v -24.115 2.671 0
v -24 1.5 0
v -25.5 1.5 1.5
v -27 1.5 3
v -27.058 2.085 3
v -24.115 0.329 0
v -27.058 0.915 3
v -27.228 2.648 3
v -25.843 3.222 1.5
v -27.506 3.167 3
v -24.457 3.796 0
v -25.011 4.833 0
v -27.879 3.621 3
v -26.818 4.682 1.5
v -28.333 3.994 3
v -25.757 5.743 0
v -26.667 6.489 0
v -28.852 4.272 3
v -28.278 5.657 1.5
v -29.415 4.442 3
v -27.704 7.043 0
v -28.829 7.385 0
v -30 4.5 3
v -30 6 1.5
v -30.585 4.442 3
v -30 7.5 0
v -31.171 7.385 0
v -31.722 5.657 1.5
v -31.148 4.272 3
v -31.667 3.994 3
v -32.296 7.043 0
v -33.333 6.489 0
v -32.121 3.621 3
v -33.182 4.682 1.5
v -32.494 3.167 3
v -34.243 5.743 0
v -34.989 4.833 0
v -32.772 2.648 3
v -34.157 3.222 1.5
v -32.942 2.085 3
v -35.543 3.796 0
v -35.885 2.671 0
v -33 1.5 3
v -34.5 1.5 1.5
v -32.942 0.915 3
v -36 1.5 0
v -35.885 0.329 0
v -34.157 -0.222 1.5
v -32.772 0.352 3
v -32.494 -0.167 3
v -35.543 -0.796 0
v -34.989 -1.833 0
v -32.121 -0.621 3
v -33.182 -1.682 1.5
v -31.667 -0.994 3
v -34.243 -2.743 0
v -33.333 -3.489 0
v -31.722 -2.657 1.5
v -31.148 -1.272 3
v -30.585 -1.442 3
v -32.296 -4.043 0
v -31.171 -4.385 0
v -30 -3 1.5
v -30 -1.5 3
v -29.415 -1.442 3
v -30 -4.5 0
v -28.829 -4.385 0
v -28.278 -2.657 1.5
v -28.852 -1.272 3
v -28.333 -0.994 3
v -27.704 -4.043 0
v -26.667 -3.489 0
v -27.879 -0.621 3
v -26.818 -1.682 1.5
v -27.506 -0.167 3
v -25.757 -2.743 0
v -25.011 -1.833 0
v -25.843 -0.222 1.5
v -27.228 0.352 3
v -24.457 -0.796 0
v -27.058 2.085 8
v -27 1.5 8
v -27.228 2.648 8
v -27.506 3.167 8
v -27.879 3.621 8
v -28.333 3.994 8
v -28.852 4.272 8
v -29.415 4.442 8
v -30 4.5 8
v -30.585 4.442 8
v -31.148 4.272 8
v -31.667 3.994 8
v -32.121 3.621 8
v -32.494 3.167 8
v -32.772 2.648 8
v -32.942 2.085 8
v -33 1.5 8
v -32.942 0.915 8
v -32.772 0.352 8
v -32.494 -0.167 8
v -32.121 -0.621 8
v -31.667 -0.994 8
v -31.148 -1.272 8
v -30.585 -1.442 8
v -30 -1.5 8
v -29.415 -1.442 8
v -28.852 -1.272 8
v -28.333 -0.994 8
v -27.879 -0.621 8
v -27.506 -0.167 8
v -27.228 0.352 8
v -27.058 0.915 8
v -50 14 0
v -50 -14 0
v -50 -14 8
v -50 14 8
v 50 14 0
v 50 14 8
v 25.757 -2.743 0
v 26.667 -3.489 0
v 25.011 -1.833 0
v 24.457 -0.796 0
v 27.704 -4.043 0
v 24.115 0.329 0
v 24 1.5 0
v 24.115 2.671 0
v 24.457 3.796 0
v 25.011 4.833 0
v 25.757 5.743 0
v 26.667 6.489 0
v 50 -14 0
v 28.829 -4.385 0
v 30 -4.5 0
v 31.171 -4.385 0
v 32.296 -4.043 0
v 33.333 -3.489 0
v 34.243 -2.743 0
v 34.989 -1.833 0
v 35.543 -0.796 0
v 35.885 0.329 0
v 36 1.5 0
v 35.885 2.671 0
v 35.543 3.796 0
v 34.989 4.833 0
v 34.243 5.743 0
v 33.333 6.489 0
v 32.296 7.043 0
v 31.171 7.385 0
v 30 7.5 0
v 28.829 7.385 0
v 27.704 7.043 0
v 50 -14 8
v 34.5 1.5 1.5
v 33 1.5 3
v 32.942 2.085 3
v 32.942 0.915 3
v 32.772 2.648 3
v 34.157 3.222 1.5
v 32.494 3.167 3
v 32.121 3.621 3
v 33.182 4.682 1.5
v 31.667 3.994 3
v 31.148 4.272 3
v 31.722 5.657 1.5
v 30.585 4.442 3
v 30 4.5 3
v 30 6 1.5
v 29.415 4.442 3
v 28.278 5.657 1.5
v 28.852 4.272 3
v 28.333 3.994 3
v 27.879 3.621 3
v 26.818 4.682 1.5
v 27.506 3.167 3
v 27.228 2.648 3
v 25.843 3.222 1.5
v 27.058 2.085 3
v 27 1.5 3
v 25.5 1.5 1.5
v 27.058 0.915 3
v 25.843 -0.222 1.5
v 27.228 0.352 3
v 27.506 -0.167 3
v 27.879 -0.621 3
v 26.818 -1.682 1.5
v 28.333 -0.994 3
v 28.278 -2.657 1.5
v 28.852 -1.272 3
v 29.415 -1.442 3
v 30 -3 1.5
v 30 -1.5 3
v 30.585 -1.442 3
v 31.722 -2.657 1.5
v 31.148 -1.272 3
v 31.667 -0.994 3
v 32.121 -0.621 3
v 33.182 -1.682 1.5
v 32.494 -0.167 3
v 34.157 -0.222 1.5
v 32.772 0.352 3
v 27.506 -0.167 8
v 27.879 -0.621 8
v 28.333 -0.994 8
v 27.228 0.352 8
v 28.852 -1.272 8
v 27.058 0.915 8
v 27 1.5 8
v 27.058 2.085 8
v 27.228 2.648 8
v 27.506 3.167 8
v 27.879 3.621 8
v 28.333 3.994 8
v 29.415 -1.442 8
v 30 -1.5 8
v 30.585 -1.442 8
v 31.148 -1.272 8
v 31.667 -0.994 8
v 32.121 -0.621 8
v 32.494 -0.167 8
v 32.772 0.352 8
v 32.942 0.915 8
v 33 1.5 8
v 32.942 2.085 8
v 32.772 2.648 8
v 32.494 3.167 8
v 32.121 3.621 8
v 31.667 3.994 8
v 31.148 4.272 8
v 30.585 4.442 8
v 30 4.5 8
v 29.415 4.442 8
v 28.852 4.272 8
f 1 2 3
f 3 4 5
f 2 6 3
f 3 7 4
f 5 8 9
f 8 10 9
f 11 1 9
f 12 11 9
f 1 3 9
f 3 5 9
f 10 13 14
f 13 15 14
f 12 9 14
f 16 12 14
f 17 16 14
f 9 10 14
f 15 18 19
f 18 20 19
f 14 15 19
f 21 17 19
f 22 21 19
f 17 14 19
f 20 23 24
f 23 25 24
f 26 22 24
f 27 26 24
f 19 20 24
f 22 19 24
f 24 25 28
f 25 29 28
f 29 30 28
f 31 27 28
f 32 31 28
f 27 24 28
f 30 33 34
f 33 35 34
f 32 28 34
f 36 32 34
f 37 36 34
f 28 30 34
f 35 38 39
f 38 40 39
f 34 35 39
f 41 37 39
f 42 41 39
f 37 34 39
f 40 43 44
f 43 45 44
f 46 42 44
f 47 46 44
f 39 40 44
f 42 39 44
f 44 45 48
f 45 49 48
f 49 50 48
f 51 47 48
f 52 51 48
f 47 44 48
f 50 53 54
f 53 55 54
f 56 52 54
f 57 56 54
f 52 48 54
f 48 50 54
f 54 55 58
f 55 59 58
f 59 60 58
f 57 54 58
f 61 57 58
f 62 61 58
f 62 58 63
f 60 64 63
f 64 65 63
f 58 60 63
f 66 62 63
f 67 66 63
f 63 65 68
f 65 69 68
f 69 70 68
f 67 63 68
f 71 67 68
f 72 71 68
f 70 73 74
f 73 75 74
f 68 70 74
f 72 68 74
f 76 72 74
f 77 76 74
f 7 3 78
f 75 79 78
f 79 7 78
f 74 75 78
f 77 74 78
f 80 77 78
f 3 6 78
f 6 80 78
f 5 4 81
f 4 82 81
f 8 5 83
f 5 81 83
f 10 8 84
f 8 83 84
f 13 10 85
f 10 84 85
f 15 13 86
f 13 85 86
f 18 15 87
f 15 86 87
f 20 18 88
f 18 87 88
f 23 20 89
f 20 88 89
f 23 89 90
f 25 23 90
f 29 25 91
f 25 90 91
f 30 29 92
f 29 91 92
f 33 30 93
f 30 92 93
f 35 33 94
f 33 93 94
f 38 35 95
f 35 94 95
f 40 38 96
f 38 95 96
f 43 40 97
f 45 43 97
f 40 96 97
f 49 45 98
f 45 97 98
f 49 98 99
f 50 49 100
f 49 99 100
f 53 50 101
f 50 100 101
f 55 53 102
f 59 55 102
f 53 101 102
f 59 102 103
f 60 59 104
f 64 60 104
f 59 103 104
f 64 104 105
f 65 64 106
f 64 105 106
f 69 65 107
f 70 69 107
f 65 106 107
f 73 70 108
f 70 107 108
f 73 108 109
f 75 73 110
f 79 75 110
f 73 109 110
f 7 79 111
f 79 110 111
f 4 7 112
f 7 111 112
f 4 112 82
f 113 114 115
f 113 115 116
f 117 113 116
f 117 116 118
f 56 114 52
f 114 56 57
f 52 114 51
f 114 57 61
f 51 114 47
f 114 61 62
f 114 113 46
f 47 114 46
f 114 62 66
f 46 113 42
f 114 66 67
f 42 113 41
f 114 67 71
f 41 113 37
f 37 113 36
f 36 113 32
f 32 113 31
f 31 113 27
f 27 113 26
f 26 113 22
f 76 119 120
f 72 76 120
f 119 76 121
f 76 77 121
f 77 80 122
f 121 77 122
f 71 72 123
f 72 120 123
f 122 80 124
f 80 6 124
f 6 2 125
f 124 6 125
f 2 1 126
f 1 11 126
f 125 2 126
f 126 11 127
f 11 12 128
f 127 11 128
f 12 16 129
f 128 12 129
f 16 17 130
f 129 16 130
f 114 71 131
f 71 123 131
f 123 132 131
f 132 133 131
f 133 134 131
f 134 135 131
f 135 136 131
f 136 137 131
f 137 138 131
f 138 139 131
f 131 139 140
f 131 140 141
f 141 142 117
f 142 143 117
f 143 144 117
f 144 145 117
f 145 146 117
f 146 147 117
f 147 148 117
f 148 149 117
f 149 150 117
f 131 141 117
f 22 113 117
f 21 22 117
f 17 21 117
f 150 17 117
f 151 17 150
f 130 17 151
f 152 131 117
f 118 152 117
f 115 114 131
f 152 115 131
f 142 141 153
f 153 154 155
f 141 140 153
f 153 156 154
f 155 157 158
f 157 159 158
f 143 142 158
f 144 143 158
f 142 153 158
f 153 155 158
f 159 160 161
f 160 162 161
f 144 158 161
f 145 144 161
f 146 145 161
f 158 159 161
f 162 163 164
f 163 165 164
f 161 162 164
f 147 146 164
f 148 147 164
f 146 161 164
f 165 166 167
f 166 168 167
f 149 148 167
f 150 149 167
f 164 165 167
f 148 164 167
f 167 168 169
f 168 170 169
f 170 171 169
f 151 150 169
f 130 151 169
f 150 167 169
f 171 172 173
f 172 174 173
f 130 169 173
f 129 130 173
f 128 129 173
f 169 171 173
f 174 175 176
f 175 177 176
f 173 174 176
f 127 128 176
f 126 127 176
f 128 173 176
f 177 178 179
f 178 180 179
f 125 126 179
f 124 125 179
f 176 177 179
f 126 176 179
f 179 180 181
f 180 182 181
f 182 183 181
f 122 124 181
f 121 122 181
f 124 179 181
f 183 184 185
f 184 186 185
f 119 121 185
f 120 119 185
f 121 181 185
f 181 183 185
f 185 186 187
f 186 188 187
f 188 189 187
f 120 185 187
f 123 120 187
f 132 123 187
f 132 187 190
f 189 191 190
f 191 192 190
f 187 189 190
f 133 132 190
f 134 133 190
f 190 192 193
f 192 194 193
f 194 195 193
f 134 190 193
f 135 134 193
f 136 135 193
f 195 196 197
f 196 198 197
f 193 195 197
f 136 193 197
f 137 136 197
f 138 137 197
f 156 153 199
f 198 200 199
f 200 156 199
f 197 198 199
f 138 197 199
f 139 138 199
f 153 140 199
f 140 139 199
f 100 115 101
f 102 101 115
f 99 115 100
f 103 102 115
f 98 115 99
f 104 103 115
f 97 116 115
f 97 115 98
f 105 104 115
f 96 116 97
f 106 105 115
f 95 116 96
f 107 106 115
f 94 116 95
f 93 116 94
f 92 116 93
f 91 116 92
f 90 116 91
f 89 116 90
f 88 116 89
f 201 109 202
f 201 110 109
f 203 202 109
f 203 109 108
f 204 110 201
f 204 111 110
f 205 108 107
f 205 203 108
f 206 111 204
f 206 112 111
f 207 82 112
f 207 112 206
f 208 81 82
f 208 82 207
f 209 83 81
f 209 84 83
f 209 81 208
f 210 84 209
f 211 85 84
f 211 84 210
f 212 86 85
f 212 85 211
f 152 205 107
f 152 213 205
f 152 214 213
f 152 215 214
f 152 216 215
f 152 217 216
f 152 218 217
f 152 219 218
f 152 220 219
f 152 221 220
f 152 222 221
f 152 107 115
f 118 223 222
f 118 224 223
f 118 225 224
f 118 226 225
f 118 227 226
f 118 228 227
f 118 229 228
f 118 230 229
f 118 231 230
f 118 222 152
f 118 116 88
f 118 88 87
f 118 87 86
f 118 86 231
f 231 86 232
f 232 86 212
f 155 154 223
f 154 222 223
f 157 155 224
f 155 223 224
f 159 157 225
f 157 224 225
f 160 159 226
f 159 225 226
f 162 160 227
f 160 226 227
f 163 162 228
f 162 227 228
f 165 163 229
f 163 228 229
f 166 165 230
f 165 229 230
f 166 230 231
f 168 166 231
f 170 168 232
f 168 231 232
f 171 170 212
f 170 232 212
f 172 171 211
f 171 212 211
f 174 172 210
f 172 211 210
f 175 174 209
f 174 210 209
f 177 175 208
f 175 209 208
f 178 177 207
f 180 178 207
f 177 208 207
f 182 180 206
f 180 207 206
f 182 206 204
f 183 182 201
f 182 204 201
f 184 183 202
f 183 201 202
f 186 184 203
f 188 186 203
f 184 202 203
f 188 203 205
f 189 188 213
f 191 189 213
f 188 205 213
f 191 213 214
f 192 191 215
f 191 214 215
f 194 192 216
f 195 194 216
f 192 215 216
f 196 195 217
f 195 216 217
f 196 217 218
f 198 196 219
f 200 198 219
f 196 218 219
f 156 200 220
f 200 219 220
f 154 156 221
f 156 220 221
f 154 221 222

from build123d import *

# Parameters (mm, degrees)
SKETCH1_W                                           = 100
SKETCH1_H                                           = 28
BOSS_EXTRUDE1_DEPTH                                 = 8
CSK_FOR_M6_COUNTERSUNK_FLAT_HEAD_SCREW1_D           = 6
CSK_FOR_M6_COUNTERSUNK_FLAT_HEAD_SCREW1_CSINK_D     = 12
CSK_FOR_M6_COUNTERSUNK_FLAT_HEAD_SCREW1_CSINK_ANGLE = 90


with BuildPart() as part:
    # Sketch1 → Boss-Extrude1 (new body)
    with BuildSketch(Plane.XY):
        Rectangle(SKETCH1_W, SKETCH1_H)
    extrude(amount=BOSS_EXTRUDE1_DEPTH)

    # CSK for M6 Countersunk Flat Head Screw1 (through all)
    with Locations(Plane(origin=(0, 0, 0), x_dir=(-1, 0, 0), z_dir=(0, 0, -1))):
        with Locations((30, 1.5), (-30, 1.5)):
            CounterSinkHole(CSK_FOR_M6_COUNTERSUNK_FLAT_HEAD_SCREW1_D / 2, CSK_FOR_M6_COUNTERSUNK_FLAT_HEAD_SCREW1_CSINK_D / 2, counter_sink_angle=CSK_FOR_M6_COUNTERSUNK_FLAT_HEAD_SCREW1_CSINK_ANGLE)


solid = part.part
